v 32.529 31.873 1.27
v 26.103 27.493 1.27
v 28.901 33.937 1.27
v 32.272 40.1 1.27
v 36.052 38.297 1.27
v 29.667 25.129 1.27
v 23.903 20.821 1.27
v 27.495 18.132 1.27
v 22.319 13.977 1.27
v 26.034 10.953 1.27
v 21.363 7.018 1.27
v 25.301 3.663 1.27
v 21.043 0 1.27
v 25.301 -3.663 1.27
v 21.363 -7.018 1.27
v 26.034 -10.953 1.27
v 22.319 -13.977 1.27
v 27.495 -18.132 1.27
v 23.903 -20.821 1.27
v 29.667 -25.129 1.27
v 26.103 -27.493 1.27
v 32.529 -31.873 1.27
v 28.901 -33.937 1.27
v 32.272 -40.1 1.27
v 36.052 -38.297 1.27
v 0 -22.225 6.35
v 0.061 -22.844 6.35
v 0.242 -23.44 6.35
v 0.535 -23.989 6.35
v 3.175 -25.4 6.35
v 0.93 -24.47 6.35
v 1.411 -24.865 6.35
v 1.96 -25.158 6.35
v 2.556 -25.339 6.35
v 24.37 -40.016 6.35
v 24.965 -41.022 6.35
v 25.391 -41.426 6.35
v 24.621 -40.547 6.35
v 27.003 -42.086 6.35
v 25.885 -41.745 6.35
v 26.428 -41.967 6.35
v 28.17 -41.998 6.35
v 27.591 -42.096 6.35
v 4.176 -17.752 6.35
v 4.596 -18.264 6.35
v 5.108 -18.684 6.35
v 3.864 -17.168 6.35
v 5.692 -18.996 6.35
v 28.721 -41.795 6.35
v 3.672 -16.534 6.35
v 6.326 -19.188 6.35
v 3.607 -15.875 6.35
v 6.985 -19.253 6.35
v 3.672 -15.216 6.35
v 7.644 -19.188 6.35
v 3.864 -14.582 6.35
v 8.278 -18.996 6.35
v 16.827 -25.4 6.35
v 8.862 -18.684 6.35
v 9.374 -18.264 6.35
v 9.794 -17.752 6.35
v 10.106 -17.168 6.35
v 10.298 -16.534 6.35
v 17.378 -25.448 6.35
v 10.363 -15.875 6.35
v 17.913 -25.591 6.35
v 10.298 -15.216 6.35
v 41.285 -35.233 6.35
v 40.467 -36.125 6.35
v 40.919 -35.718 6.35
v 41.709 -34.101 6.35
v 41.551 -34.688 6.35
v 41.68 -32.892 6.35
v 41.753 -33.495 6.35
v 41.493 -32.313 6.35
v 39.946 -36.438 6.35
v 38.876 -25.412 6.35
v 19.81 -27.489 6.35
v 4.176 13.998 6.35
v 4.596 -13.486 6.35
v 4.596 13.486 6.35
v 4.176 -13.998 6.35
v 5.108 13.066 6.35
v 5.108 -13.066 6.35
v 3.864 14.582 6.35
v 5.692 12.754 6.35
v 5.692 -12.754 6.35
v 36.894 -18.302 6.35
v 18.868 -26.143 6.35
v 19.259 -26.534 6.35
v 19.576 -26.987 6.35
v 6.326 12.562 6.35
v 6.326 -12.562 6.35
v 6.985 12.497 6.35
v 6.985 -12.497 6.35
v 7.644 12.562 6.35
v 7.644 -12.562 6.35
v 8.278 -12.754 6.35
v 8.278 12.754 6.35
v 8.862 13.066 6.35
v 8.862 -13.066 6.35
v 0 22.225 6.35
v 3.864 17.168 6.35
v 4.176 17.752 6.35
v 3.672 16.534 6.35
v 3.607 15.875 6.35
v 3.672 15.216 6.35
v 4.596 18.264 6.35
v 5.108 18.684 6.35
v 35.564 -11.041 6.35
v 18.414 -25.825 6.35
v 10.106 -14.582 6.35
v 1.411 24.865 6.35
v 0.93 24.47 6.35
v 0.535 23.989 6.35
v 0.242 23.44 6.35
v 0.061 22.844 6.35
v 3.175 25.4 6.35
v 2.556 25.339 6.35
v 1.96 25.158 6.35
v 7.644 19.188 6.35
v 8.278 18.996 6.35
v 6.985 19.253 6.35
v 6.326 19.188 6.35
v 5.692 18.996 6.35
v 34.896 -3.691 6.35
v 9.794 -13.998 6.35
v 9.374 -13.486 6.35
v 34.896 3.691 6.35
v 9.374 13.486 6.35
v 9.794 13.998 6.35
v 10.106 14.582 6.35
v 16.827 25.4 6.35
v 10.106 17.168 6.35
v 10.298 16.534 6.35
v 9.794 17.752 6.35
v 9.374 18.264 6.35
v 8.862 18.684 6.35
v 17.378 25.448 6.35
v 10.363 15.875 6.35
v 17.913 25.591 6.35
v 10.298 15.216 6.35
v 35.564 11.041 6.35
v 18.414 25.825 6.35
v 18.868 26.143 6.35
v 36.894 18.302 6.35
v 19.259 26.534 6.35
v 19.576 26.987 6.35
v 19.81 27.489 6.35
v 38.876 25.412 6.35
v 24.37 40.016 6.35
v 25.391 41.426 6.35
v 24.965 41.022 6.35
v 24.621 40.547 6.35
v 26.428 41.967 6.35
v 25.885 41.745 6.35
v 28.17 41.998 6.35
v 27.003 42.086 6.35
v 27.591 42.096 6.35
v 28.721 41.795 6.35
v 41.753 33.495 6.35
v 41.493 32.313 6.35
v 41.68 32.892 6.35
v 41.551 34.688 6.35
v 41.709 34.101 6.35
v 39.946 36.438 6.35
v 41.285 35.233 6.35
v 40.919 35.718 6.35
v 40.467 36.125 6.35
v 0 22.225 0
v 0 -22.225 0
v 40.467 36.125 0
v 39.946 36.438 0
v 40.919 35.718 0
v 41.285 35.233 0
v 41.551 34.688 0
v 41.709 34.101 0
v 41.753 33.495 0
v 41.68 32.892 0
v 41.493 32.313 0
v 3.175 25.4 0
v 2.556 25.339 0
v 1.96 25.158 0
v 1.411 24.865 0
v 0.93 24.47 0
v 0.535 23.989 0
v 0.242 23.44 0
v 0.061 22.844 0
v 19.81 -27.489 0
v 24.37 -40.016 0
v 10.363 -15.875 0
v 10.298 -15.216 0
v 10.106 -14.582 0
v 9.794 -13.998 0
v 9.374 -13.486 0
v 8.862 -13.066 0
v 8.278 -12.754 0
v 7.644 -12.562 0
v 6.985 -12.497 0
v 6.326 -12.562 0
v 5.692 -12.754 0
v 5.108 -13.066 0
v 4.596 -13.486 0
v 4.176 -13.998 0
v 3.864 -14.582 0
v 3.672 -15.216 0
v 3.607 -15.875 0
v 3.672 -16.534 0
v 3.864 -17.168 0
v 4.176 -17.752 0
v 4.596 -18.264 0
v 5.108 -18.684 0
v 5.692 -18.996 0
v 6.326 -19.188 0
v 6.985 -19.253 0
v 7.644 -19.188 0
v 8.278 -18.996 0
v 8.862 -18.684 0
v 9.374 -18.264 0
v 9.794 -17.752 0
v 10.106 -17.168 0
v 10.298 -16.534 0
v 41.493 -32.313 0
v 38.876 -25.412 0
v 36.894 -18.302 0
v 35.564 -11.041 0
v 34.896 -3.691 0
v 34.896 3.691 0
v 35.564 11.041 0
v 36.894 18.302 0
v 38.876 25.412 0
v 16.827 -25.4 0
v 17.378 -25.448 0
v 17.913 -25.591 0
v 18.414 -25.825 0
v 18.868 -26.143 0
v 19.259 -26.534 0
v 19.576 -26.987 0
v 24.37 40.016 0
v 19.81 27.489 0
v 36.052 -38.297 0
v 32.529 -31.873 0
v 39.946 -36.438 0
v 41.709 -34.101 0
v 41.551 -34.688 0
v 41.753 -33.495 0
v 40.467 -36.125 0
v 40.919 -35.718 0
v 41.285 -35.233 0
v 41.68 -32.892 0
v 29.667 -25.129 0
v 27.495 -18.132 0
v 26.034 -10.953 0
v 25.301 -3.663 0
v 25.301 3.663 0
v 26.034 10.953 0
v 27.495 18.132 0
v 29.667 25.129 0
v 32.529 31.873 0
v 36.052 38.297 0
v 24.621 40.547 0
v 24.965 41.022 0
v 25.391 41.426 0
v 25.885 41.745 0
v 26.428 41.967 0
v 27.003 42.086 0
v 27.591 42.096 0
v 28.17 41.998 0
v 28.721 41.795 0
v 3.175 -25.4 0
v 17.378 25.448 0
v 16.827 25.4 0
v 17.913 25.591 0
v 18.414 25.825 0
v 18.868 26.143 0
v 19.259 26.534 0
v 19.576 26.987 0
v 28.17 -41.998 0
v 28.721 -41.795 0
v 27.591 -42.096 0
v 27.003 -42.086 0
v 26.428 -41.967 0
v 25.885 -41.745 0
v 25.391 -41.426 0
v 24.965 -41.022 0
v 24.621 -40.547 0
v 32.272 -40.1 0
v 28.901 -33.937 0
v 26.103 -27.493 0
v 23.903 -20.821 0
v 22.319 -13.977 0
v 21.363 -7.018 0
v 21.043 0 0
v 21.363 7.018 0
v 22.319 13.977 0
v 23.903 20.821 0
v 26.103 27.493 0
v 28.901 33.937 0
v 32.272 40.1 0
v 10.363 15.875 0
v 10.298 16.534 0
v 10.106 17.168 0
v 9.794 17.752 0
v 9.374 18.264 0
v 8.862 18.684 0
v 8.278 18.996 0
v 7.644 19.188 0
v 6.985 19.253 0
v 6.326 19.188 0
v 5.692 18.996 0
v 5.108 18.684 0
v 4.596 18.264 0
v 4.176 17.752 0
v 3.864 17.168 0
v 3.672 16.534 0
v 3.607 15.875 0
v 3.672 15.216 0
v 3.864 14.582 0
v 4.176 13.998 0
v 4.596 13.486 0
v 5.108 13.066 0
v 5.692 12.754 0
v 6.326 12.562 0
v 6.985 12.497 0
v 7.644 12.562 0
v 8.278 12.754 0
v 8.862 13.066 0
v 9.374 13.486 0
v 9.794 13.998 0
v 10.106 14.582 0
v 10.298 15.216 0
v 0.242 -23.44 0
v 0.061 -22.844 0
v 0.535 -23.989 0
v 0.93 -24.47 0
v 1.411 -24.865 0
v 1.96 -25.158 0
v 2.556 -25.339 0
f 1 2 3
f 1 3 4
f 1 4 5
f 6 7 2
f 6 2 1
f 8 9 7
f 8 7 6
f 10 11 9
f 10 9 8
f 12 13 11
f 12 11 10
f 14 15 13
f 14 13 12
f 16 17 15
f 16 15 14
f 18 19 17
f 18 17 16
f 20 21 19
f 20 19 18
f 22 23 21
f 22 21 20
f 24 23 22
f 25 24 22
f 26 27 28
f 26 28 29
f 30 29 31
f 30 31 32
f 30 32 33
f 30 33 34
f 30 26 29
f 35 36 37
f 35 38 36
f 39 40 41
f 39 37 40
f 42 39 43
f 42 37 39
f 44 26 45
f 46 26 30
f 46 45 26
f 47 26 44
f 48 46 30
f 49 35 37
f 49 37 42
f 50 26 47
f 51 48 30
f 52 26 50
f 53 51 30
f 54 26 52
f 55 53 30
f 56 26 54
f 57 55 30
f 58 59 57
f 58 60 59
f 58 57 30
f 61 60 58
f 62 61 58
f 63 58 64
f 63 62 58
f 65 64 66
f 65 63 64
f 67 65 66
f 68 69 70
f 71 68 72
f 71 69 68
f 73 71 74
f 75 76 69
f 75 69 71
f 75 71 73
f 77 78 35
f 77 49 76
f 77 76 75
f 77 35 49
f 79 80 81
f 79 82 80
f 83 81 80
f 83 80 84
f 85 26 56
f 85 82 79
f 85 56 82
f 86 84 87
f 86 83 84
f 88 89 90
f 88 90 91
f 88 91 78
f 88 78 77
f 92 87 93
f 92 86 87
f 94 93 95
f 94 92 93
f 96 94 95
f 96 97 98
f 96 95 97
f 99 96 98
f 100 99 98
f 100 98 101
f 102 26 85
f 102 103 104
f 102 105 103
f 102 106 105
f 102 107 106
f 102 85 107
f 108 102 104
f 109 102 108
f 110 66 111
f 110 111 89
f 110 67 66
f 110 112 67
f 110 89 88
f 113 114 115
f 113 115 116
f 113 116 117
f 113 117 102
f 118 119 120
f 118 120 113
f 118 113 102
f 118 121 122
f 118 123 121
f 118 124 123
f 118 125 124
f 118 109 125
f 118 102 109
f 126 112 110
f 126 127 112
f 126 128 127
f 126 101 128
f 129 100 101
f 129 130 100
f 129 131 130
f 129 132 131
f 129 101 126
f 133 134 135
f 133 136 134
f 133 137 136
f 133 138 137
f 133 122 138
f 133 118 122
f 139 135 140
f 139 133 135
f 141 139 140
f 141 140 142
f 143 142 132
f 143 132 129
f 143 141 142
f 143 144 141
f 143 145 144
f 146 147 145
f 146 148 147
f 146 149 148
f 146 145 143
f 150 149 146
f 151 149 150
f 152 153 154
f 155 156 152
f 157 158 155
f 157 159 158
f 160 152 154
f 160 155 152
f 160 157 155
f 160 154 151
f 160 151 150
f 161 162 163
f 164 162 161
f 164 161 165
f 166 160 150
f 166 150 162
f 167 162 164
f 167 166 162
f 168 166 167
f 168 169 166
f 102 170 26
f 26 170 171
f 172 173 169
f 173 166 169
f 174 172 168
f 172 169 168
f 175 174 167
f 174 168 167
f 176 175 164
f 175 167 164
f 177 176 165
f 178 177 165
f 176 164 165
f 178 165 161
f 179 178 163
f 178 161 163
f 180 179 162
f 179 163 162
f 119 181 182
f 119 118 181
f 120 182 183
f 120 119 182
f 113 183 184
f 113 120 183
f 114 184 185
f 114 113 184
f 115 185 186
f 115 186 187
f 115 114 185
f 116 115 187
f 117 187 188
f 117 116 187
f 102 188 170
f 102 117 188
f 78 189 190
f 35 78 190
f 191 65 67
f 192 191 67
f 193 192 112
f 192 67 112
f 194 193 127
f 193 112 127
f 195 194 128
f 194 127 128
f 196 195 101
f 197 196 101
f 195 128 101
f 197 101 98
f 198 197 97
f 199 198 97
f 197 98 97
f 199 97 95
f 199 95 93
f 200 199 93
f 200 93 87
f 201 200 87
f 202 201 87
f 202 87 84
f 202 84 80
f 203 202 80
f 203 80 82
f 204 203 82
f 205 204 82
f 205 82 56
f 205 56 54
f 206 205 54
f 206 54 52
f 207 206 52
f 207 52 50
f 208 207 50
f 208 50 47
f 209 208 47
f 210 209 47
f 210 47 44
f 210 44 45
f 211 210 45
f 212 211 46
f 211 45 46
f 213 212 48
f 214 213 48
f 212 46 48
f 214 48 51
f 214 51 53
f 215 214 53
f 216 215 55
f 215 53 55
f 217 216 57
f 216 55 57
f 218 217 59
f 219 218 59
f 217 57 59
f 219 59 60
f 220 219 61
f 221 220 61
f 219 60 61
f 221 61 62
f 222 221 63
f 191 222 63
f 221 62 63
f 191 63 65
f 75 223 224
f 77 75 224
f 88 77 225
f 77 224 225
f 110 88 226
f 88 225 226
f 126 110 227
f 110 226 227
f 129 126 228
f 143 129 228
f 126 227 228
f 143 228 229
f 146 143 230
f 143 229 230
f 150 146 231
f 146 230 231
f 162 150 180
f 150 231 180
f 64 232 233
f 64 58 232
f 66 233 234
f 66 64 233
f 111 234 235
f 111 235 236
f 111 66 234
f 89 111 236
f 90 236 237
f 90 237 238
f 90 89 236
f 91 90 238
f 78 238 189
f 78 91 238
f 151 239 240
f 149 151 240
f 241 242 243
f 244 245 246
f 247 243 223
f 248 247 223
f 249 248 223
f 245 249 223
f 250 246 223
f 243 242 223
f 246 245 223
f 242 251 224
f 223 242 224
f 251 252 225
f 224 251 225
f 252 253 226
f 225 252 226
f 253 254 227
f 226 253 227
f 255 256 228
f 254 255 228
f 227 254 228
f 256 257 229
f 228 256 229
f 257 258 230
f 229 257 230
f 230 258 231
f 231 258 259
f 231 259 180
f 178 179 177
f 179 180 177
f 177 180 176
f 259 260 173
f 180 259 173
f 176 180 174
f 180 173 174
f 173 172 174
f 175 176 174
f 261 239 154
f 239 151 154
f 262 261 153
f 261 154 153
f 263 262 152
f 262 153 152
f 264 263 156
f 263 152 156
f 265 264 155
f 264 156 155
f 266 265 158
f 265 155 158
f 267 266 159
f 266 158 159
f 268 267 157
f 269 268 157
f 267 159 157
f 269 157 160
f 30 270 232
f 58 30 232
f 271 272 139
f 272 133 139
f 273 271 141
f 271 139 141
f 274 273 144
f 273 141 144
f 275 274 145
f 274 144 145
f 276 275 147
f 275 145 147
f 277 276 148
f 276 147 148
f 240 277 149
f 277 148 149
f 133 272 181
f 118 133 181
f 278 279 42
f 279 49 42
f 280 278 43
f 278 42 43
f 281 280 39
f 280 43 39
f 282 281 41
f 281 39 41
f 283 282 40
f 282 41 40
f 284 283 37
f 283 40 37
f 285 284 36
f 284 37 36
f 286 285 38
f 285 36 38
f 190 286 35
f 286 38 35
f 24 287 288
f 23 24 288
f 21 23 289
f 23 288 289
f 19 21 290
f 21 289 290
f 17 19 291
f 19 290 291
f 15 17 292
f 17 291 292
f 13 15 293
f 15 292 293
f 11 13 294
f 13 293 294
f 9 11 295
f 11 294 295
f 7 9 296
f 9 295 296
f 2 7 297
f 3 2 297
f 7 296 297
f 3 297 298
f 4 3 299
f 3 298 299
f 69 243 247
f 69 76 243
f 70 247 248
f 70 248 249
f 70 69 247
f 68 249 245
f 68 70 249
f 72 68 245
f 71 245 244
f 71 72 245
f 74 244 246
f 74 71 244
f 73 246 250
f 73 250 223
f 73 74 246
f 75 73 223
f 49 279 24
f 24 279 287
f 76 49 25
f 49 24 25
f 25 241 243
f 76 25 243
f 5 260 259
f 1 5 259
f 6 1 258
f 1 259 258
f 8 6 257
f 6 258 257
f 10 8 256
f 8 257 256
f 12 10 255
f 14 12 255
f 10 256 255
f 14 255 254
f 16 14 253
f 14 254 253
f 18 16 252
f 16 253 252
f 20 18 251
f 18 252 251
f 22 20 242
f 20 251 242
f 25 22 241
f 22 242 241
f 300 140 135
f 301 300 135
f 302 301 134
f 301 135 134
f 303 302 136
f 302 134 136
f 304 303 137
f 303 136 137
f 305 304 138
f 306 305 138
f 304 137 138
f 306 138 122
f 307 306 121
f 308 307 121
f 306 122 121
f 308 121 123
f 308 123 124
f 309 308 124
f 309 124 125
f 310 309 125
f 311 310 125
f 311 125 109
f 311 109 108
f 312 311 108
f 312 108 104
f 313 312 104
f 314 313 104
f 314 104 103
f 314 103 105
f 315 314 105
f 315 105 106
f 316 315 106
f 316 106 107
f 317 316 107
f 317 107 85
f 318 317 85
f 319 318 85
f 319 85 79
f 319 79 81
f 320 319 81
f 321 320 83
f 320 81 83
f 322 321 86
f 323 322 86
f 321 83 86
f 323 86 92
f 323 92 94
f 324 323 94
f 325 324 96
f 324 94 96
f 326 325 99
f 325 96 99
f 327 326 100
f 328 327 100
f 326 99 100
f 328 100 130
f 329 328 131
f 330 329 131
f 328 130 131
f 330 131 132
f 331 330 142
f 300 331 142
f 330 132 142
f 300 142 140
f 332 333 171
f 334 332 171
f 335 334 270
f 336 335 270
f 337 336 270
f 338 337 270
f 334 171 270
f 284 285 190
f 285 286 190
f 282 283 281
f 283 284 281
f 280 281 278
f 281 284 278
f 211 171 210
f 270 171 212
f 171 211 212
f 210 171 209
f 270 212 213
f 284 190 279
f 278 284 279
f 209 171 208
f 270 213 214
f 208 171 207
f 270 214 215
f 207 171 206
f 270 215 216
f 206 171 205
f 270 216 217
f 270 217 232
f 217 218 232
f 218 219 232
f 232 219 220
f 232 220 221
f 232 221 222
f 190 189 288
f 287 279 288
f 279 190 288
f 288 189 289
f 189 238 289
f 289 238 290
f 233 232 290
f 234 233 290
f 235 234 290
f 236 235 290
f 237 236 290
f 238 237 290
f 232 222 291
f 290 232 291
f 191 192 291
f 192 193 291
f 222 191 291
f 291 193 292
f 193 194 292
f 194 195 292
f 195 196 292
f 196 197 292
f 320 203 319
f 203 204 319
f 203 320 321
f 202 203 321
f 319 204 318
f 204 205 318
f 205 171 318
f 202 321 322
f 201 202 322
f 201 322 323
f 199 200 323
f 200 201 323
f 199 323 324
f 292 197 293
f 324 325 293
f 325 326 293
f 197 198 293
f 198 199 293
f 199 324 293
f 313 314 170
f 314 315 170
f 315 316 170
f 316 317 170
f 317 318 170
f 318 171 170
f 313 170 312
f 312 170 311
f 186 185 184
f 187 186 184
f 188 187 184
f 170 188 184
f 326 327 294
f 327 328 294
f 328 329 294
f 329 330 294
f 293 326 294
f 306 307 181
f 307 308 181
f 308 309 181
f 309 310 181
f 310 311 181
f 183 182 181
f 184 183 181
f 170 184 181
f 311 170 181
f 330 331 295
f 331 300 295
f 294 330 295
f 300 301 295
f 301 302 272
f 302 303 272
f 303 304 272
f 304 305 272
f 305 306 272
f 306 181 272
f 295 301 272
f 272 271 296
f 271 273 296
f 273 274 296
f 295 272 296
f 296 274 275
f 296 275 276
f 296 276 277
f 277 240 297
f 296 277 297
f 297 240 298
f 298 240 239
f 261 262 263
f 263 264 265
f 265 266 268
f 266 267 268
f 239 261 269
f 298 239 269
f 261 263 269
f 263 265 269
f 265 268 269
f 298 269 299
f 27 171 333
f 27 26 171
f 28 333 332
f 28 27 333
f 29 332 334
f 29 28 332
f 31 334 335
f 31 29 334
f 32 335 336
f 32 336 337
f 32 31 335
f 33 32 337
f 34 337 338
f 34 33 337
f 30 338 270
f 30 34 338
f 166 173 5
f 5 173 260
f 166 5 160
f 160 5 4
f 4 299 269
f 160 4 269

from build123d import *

# Parameters (mm, degrees)
F1_DEPTH = 6.35
F3_DEPTH = 1.27
F4_R     = 3.3782
F5_DEPTH = 6.351
F6_R     = 3.175


with BuildPart() as f1:
    # F0 (on Top) → F1 (new body)
    with BuildSketch(Plane.XY):
        with BuildLine():
            Line((19.05, 25.4), (0, 25.4))
            Line((0, 25.4), (0, -25.4))
            Line((0, -25.4), (19.05, -25.4))
            Line((19.05, -25.4), (25.565484, -43.301144))
            Line((25.565484, -43.301144), (42.757881, -35.096026))
            ThreePointArc((42.757881, -35.096026), (34.812296, 0), (42.757881, 35.096026))
            Line((42.757881, 35.096026), (25.565484, 43.301144))
            Line((25.565484, 43.301144), (19.05, 25.4))
        make_face()
    extrude(amount=F1_DEPTH)

    # F2 (on face) → F3 (cut)
    with BuildSketch(Plane(origin=(0, 0, 0), x_dir=(1, 0, 0), z_dir=(0, 0, -1))):
        with BuildLine():
            Line((36.051805, 38.296519), (32.272126, 40.100381))
            ThreePointArc((32.272126, 40.100381), (21.04302, 0), (32.272126, -40.100381))
            Line((32.272126, -40.100381), (36.051805, -38.296519))
            ThreePointArc((36.051805, -38.296519), (25.20862, 0), (36.051805, 38.296519))
        make_face()
    extrude(amount=-F3_DEPTH, mode=Mode.SUBTRACT)

    # F4 (on face) → F5 (cut, through all)
    with BuildSketch(Plane.XY.offset(6.35)):
        with Locations((6.985, 15.875)):
            Circle(F4_R)
        with Locations((6.985, -15.875)):
            Circle(F4_R)
    extrude(amount=-F5_DEPTH, mode=Mode.SUBTRACT)

    # F6
    f6_edges = [f1.edges().sort_by_distance(p)[0] for p in [
        (0, -25.4, 3.175),
        (19.05, -25.4, 3.175),
        (25.565484, -43.301144, 3.175),
        (42.757881, -35.096026, 3.175),
        (0, 25.4, 3.175),
        (42.757881, 35.096026, 3.175),
        (25.565484, 43.301144, 3.175),
        (19.05, 25.4, 3.175),
    ]]
    fillet(f6_edges, radius=F6_R)


solid = f1.part
